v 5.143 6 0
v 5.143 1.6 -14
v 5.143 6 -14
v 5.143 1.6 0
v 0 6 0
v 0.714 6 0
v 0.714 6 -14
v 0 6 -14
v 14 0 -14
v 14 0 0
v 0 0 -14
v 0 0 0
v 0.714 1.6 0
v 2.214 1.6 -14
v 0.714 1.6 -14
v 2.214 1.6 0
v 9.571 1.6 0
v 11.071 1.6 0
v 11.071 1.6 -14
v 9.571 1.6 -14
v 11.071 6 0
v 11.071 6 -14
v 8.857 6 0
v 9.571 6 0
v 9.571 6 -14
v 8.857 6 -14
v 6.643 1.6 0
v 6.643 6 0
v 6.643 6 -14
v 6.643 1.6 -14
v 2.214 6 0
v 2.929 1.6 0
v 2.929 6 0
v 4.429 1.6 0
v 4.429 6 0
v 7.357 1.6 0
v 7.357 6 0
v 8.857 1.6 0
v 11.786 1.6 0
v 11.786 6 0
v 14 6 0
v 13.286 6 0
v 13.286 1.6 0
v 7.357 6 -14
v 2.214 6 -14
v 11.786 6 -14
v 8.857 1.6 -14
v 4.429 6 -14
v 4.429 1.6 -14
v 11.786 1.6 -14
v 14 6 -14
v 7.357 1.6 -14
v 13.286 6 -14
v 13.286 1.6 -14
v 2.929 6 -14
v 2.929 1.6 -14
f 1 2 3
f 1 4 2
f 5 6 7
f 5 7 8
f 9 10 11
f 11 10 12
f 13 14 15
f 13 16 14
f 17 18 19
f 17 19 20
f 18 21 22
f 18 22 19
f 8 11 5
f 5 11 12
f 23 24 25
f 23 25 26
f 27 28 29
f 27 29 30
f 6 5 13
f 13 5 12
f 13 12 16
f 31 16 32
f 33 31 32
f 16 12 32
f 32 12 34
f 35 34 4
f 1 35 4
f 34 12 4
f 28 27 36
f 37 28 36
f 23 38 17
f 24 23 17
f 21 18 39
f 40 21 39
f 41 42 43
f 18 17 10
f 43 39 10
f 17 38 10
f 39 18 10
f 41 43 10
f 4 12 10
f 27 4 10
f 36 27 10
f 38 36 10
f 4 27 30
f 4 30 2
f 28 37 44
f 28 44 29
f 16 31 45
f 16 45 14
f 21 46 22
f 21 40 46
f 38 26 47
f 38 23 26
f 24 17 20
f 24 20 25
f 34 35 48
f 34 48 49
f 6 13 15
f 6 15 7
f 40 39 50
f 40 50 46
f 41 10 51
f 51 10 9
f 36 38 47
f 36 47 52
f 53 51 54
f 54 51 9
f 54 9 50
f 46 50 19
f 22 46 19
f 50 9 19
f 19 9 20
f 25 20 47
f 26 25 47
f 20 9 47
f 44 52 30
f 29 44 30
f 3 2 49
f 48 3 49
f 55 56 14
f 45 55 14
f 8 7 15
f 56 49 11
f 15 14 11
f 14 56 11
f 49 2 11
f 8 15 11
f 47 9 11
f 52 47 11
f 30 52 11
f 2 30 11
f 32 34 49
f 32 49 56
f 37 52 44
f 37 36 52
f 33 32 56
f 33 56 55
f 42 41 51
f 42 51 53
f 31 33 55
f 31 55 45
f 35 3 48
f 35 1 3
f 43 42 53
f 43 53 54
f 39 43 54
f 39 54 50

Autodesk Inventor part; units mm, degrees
ref_plane "YZ Plane" through (0, 0, 0) normal (1, 0, 0) x (0, 1, 0)
ref_plane "XZ Plane" through (0, 0, 0) normal (0, 1, 0) x (-1, 0, 0)
ref_plane "XY Plane" through (0, 0, 0) normal (0, 0, 1) x (1, 0, 0)
sketch "Sketch1" plane through (0, 0, 0) normal (0, 1, 0) x (-1, 0, 0)
  line L0 (0, 0) -> (-14, 0)
  line L1 (-14, 0) -> (-14, -14)
  line L2 (-14, -14) -> (0, -14)
  line L3 (0, -14) -> (0, 0)
  dimension "d0" = 14
  dimension "d1" = 14
extrude "Extrusion1" add sketch "Sketch1" along normal blind 6
sketch "Sketch2" plane through (0, 0, 0) normal (0, 0, 1) x (1, 0, 0)
  line L0 (0, 0) -> (14, 0) projected
  line L1 (14, 0) -> (14, 6) projected
  line L2 (0, 6) -> (14, 6) projected
  line L3 (0, 0) -> (0, 6) projected
  line L4 (0.7143, 6) -> (2.2143, 6)
  line L5 (2.2143, 6) -> (2.2143, 1.6)
  line L6 (2.2143, 1.6) -> (0.7143, 1.6)
  line L7 (0.7143, 1.6) -> (0.7143, 6)
  line L8 (0.7143, 3.8) -> (0, 3.8) construction
  line L9 (4.4286, 6) -> (4.4286, 1.6)
  line L10 (4.4286, 1.6) -> (2.9286, 1.6)
  line L11 (2.9286, 1.6) -> (2.9286, 6)
  line L12 (2.9286, 3.8) -> (2.2143, 3.8) construction
  line L13 (6.6429, 6) -> (6.6429, 1.6)
  line L14 (6.6429, 1.6) -> (5.1429, 1.6)
  line L15 (5.1429, 1.6) -> (5.1429, 6)
  line L16 (5.1429, 3.8) -> (4.4286, 3.8) construction
  line L17 (8.8571, 6) -> (8.8571, 1.6)
  line L18 (8.8571, 1.6) -> (7.3571, 1.6)
  line L19 (7.3571, 1.6) -> (7.3571, 6)
  line L20 (7.3571, 3.8) -> (6.6429, 3.8) construction
  line L21 (11.0714, 6) -> (11.0714, 1.6)
  line L22 (11.0714, 1.6) -> (9.5714, 1.6)
  line L23 (9.5714, 1.6) -> (9.5714, 6)
  line L24 (9.5714, 3.8) -> (8.8571, 3.8) construction
  line L25 (0, 6) -> (14, 6) projected
  line L26 (13.2857, 6) -> (13.2857, 1.6)
  line L27 (13.2857, 1.6) -> (11.7857, 1.6)
  line L28 (11.7857, 1.6) -> (11.7857, 6)
  line L29 (11.7857, 3.8) -> (11.0714, 3.8) construction
  line L30 (13.2857, 3.8) -> (14, 3.8) construction
  dimension "d4" = 6
  dimension "d5" = 1.6
  dimension "d6" = 1.5
  dimension "d8" = 1.5
  dimension "d9" = 1.5
  dimension "d10" = 1.5
  dimension "d11" = 1.5
  dimension "d12" = 1.5
extrude "Extrusion2" cut sketch "Sketch2" against normal through all contours L2 L5 L6 L7 | L26 L27 L28 L2 | L2 L9 L10 L11 | L21 L22 L23 L2 | L2 L13 L14 L15 | L17 L18 L19 L2
properties part number "HEATSINK14x14" material "Aluminum 6061"
